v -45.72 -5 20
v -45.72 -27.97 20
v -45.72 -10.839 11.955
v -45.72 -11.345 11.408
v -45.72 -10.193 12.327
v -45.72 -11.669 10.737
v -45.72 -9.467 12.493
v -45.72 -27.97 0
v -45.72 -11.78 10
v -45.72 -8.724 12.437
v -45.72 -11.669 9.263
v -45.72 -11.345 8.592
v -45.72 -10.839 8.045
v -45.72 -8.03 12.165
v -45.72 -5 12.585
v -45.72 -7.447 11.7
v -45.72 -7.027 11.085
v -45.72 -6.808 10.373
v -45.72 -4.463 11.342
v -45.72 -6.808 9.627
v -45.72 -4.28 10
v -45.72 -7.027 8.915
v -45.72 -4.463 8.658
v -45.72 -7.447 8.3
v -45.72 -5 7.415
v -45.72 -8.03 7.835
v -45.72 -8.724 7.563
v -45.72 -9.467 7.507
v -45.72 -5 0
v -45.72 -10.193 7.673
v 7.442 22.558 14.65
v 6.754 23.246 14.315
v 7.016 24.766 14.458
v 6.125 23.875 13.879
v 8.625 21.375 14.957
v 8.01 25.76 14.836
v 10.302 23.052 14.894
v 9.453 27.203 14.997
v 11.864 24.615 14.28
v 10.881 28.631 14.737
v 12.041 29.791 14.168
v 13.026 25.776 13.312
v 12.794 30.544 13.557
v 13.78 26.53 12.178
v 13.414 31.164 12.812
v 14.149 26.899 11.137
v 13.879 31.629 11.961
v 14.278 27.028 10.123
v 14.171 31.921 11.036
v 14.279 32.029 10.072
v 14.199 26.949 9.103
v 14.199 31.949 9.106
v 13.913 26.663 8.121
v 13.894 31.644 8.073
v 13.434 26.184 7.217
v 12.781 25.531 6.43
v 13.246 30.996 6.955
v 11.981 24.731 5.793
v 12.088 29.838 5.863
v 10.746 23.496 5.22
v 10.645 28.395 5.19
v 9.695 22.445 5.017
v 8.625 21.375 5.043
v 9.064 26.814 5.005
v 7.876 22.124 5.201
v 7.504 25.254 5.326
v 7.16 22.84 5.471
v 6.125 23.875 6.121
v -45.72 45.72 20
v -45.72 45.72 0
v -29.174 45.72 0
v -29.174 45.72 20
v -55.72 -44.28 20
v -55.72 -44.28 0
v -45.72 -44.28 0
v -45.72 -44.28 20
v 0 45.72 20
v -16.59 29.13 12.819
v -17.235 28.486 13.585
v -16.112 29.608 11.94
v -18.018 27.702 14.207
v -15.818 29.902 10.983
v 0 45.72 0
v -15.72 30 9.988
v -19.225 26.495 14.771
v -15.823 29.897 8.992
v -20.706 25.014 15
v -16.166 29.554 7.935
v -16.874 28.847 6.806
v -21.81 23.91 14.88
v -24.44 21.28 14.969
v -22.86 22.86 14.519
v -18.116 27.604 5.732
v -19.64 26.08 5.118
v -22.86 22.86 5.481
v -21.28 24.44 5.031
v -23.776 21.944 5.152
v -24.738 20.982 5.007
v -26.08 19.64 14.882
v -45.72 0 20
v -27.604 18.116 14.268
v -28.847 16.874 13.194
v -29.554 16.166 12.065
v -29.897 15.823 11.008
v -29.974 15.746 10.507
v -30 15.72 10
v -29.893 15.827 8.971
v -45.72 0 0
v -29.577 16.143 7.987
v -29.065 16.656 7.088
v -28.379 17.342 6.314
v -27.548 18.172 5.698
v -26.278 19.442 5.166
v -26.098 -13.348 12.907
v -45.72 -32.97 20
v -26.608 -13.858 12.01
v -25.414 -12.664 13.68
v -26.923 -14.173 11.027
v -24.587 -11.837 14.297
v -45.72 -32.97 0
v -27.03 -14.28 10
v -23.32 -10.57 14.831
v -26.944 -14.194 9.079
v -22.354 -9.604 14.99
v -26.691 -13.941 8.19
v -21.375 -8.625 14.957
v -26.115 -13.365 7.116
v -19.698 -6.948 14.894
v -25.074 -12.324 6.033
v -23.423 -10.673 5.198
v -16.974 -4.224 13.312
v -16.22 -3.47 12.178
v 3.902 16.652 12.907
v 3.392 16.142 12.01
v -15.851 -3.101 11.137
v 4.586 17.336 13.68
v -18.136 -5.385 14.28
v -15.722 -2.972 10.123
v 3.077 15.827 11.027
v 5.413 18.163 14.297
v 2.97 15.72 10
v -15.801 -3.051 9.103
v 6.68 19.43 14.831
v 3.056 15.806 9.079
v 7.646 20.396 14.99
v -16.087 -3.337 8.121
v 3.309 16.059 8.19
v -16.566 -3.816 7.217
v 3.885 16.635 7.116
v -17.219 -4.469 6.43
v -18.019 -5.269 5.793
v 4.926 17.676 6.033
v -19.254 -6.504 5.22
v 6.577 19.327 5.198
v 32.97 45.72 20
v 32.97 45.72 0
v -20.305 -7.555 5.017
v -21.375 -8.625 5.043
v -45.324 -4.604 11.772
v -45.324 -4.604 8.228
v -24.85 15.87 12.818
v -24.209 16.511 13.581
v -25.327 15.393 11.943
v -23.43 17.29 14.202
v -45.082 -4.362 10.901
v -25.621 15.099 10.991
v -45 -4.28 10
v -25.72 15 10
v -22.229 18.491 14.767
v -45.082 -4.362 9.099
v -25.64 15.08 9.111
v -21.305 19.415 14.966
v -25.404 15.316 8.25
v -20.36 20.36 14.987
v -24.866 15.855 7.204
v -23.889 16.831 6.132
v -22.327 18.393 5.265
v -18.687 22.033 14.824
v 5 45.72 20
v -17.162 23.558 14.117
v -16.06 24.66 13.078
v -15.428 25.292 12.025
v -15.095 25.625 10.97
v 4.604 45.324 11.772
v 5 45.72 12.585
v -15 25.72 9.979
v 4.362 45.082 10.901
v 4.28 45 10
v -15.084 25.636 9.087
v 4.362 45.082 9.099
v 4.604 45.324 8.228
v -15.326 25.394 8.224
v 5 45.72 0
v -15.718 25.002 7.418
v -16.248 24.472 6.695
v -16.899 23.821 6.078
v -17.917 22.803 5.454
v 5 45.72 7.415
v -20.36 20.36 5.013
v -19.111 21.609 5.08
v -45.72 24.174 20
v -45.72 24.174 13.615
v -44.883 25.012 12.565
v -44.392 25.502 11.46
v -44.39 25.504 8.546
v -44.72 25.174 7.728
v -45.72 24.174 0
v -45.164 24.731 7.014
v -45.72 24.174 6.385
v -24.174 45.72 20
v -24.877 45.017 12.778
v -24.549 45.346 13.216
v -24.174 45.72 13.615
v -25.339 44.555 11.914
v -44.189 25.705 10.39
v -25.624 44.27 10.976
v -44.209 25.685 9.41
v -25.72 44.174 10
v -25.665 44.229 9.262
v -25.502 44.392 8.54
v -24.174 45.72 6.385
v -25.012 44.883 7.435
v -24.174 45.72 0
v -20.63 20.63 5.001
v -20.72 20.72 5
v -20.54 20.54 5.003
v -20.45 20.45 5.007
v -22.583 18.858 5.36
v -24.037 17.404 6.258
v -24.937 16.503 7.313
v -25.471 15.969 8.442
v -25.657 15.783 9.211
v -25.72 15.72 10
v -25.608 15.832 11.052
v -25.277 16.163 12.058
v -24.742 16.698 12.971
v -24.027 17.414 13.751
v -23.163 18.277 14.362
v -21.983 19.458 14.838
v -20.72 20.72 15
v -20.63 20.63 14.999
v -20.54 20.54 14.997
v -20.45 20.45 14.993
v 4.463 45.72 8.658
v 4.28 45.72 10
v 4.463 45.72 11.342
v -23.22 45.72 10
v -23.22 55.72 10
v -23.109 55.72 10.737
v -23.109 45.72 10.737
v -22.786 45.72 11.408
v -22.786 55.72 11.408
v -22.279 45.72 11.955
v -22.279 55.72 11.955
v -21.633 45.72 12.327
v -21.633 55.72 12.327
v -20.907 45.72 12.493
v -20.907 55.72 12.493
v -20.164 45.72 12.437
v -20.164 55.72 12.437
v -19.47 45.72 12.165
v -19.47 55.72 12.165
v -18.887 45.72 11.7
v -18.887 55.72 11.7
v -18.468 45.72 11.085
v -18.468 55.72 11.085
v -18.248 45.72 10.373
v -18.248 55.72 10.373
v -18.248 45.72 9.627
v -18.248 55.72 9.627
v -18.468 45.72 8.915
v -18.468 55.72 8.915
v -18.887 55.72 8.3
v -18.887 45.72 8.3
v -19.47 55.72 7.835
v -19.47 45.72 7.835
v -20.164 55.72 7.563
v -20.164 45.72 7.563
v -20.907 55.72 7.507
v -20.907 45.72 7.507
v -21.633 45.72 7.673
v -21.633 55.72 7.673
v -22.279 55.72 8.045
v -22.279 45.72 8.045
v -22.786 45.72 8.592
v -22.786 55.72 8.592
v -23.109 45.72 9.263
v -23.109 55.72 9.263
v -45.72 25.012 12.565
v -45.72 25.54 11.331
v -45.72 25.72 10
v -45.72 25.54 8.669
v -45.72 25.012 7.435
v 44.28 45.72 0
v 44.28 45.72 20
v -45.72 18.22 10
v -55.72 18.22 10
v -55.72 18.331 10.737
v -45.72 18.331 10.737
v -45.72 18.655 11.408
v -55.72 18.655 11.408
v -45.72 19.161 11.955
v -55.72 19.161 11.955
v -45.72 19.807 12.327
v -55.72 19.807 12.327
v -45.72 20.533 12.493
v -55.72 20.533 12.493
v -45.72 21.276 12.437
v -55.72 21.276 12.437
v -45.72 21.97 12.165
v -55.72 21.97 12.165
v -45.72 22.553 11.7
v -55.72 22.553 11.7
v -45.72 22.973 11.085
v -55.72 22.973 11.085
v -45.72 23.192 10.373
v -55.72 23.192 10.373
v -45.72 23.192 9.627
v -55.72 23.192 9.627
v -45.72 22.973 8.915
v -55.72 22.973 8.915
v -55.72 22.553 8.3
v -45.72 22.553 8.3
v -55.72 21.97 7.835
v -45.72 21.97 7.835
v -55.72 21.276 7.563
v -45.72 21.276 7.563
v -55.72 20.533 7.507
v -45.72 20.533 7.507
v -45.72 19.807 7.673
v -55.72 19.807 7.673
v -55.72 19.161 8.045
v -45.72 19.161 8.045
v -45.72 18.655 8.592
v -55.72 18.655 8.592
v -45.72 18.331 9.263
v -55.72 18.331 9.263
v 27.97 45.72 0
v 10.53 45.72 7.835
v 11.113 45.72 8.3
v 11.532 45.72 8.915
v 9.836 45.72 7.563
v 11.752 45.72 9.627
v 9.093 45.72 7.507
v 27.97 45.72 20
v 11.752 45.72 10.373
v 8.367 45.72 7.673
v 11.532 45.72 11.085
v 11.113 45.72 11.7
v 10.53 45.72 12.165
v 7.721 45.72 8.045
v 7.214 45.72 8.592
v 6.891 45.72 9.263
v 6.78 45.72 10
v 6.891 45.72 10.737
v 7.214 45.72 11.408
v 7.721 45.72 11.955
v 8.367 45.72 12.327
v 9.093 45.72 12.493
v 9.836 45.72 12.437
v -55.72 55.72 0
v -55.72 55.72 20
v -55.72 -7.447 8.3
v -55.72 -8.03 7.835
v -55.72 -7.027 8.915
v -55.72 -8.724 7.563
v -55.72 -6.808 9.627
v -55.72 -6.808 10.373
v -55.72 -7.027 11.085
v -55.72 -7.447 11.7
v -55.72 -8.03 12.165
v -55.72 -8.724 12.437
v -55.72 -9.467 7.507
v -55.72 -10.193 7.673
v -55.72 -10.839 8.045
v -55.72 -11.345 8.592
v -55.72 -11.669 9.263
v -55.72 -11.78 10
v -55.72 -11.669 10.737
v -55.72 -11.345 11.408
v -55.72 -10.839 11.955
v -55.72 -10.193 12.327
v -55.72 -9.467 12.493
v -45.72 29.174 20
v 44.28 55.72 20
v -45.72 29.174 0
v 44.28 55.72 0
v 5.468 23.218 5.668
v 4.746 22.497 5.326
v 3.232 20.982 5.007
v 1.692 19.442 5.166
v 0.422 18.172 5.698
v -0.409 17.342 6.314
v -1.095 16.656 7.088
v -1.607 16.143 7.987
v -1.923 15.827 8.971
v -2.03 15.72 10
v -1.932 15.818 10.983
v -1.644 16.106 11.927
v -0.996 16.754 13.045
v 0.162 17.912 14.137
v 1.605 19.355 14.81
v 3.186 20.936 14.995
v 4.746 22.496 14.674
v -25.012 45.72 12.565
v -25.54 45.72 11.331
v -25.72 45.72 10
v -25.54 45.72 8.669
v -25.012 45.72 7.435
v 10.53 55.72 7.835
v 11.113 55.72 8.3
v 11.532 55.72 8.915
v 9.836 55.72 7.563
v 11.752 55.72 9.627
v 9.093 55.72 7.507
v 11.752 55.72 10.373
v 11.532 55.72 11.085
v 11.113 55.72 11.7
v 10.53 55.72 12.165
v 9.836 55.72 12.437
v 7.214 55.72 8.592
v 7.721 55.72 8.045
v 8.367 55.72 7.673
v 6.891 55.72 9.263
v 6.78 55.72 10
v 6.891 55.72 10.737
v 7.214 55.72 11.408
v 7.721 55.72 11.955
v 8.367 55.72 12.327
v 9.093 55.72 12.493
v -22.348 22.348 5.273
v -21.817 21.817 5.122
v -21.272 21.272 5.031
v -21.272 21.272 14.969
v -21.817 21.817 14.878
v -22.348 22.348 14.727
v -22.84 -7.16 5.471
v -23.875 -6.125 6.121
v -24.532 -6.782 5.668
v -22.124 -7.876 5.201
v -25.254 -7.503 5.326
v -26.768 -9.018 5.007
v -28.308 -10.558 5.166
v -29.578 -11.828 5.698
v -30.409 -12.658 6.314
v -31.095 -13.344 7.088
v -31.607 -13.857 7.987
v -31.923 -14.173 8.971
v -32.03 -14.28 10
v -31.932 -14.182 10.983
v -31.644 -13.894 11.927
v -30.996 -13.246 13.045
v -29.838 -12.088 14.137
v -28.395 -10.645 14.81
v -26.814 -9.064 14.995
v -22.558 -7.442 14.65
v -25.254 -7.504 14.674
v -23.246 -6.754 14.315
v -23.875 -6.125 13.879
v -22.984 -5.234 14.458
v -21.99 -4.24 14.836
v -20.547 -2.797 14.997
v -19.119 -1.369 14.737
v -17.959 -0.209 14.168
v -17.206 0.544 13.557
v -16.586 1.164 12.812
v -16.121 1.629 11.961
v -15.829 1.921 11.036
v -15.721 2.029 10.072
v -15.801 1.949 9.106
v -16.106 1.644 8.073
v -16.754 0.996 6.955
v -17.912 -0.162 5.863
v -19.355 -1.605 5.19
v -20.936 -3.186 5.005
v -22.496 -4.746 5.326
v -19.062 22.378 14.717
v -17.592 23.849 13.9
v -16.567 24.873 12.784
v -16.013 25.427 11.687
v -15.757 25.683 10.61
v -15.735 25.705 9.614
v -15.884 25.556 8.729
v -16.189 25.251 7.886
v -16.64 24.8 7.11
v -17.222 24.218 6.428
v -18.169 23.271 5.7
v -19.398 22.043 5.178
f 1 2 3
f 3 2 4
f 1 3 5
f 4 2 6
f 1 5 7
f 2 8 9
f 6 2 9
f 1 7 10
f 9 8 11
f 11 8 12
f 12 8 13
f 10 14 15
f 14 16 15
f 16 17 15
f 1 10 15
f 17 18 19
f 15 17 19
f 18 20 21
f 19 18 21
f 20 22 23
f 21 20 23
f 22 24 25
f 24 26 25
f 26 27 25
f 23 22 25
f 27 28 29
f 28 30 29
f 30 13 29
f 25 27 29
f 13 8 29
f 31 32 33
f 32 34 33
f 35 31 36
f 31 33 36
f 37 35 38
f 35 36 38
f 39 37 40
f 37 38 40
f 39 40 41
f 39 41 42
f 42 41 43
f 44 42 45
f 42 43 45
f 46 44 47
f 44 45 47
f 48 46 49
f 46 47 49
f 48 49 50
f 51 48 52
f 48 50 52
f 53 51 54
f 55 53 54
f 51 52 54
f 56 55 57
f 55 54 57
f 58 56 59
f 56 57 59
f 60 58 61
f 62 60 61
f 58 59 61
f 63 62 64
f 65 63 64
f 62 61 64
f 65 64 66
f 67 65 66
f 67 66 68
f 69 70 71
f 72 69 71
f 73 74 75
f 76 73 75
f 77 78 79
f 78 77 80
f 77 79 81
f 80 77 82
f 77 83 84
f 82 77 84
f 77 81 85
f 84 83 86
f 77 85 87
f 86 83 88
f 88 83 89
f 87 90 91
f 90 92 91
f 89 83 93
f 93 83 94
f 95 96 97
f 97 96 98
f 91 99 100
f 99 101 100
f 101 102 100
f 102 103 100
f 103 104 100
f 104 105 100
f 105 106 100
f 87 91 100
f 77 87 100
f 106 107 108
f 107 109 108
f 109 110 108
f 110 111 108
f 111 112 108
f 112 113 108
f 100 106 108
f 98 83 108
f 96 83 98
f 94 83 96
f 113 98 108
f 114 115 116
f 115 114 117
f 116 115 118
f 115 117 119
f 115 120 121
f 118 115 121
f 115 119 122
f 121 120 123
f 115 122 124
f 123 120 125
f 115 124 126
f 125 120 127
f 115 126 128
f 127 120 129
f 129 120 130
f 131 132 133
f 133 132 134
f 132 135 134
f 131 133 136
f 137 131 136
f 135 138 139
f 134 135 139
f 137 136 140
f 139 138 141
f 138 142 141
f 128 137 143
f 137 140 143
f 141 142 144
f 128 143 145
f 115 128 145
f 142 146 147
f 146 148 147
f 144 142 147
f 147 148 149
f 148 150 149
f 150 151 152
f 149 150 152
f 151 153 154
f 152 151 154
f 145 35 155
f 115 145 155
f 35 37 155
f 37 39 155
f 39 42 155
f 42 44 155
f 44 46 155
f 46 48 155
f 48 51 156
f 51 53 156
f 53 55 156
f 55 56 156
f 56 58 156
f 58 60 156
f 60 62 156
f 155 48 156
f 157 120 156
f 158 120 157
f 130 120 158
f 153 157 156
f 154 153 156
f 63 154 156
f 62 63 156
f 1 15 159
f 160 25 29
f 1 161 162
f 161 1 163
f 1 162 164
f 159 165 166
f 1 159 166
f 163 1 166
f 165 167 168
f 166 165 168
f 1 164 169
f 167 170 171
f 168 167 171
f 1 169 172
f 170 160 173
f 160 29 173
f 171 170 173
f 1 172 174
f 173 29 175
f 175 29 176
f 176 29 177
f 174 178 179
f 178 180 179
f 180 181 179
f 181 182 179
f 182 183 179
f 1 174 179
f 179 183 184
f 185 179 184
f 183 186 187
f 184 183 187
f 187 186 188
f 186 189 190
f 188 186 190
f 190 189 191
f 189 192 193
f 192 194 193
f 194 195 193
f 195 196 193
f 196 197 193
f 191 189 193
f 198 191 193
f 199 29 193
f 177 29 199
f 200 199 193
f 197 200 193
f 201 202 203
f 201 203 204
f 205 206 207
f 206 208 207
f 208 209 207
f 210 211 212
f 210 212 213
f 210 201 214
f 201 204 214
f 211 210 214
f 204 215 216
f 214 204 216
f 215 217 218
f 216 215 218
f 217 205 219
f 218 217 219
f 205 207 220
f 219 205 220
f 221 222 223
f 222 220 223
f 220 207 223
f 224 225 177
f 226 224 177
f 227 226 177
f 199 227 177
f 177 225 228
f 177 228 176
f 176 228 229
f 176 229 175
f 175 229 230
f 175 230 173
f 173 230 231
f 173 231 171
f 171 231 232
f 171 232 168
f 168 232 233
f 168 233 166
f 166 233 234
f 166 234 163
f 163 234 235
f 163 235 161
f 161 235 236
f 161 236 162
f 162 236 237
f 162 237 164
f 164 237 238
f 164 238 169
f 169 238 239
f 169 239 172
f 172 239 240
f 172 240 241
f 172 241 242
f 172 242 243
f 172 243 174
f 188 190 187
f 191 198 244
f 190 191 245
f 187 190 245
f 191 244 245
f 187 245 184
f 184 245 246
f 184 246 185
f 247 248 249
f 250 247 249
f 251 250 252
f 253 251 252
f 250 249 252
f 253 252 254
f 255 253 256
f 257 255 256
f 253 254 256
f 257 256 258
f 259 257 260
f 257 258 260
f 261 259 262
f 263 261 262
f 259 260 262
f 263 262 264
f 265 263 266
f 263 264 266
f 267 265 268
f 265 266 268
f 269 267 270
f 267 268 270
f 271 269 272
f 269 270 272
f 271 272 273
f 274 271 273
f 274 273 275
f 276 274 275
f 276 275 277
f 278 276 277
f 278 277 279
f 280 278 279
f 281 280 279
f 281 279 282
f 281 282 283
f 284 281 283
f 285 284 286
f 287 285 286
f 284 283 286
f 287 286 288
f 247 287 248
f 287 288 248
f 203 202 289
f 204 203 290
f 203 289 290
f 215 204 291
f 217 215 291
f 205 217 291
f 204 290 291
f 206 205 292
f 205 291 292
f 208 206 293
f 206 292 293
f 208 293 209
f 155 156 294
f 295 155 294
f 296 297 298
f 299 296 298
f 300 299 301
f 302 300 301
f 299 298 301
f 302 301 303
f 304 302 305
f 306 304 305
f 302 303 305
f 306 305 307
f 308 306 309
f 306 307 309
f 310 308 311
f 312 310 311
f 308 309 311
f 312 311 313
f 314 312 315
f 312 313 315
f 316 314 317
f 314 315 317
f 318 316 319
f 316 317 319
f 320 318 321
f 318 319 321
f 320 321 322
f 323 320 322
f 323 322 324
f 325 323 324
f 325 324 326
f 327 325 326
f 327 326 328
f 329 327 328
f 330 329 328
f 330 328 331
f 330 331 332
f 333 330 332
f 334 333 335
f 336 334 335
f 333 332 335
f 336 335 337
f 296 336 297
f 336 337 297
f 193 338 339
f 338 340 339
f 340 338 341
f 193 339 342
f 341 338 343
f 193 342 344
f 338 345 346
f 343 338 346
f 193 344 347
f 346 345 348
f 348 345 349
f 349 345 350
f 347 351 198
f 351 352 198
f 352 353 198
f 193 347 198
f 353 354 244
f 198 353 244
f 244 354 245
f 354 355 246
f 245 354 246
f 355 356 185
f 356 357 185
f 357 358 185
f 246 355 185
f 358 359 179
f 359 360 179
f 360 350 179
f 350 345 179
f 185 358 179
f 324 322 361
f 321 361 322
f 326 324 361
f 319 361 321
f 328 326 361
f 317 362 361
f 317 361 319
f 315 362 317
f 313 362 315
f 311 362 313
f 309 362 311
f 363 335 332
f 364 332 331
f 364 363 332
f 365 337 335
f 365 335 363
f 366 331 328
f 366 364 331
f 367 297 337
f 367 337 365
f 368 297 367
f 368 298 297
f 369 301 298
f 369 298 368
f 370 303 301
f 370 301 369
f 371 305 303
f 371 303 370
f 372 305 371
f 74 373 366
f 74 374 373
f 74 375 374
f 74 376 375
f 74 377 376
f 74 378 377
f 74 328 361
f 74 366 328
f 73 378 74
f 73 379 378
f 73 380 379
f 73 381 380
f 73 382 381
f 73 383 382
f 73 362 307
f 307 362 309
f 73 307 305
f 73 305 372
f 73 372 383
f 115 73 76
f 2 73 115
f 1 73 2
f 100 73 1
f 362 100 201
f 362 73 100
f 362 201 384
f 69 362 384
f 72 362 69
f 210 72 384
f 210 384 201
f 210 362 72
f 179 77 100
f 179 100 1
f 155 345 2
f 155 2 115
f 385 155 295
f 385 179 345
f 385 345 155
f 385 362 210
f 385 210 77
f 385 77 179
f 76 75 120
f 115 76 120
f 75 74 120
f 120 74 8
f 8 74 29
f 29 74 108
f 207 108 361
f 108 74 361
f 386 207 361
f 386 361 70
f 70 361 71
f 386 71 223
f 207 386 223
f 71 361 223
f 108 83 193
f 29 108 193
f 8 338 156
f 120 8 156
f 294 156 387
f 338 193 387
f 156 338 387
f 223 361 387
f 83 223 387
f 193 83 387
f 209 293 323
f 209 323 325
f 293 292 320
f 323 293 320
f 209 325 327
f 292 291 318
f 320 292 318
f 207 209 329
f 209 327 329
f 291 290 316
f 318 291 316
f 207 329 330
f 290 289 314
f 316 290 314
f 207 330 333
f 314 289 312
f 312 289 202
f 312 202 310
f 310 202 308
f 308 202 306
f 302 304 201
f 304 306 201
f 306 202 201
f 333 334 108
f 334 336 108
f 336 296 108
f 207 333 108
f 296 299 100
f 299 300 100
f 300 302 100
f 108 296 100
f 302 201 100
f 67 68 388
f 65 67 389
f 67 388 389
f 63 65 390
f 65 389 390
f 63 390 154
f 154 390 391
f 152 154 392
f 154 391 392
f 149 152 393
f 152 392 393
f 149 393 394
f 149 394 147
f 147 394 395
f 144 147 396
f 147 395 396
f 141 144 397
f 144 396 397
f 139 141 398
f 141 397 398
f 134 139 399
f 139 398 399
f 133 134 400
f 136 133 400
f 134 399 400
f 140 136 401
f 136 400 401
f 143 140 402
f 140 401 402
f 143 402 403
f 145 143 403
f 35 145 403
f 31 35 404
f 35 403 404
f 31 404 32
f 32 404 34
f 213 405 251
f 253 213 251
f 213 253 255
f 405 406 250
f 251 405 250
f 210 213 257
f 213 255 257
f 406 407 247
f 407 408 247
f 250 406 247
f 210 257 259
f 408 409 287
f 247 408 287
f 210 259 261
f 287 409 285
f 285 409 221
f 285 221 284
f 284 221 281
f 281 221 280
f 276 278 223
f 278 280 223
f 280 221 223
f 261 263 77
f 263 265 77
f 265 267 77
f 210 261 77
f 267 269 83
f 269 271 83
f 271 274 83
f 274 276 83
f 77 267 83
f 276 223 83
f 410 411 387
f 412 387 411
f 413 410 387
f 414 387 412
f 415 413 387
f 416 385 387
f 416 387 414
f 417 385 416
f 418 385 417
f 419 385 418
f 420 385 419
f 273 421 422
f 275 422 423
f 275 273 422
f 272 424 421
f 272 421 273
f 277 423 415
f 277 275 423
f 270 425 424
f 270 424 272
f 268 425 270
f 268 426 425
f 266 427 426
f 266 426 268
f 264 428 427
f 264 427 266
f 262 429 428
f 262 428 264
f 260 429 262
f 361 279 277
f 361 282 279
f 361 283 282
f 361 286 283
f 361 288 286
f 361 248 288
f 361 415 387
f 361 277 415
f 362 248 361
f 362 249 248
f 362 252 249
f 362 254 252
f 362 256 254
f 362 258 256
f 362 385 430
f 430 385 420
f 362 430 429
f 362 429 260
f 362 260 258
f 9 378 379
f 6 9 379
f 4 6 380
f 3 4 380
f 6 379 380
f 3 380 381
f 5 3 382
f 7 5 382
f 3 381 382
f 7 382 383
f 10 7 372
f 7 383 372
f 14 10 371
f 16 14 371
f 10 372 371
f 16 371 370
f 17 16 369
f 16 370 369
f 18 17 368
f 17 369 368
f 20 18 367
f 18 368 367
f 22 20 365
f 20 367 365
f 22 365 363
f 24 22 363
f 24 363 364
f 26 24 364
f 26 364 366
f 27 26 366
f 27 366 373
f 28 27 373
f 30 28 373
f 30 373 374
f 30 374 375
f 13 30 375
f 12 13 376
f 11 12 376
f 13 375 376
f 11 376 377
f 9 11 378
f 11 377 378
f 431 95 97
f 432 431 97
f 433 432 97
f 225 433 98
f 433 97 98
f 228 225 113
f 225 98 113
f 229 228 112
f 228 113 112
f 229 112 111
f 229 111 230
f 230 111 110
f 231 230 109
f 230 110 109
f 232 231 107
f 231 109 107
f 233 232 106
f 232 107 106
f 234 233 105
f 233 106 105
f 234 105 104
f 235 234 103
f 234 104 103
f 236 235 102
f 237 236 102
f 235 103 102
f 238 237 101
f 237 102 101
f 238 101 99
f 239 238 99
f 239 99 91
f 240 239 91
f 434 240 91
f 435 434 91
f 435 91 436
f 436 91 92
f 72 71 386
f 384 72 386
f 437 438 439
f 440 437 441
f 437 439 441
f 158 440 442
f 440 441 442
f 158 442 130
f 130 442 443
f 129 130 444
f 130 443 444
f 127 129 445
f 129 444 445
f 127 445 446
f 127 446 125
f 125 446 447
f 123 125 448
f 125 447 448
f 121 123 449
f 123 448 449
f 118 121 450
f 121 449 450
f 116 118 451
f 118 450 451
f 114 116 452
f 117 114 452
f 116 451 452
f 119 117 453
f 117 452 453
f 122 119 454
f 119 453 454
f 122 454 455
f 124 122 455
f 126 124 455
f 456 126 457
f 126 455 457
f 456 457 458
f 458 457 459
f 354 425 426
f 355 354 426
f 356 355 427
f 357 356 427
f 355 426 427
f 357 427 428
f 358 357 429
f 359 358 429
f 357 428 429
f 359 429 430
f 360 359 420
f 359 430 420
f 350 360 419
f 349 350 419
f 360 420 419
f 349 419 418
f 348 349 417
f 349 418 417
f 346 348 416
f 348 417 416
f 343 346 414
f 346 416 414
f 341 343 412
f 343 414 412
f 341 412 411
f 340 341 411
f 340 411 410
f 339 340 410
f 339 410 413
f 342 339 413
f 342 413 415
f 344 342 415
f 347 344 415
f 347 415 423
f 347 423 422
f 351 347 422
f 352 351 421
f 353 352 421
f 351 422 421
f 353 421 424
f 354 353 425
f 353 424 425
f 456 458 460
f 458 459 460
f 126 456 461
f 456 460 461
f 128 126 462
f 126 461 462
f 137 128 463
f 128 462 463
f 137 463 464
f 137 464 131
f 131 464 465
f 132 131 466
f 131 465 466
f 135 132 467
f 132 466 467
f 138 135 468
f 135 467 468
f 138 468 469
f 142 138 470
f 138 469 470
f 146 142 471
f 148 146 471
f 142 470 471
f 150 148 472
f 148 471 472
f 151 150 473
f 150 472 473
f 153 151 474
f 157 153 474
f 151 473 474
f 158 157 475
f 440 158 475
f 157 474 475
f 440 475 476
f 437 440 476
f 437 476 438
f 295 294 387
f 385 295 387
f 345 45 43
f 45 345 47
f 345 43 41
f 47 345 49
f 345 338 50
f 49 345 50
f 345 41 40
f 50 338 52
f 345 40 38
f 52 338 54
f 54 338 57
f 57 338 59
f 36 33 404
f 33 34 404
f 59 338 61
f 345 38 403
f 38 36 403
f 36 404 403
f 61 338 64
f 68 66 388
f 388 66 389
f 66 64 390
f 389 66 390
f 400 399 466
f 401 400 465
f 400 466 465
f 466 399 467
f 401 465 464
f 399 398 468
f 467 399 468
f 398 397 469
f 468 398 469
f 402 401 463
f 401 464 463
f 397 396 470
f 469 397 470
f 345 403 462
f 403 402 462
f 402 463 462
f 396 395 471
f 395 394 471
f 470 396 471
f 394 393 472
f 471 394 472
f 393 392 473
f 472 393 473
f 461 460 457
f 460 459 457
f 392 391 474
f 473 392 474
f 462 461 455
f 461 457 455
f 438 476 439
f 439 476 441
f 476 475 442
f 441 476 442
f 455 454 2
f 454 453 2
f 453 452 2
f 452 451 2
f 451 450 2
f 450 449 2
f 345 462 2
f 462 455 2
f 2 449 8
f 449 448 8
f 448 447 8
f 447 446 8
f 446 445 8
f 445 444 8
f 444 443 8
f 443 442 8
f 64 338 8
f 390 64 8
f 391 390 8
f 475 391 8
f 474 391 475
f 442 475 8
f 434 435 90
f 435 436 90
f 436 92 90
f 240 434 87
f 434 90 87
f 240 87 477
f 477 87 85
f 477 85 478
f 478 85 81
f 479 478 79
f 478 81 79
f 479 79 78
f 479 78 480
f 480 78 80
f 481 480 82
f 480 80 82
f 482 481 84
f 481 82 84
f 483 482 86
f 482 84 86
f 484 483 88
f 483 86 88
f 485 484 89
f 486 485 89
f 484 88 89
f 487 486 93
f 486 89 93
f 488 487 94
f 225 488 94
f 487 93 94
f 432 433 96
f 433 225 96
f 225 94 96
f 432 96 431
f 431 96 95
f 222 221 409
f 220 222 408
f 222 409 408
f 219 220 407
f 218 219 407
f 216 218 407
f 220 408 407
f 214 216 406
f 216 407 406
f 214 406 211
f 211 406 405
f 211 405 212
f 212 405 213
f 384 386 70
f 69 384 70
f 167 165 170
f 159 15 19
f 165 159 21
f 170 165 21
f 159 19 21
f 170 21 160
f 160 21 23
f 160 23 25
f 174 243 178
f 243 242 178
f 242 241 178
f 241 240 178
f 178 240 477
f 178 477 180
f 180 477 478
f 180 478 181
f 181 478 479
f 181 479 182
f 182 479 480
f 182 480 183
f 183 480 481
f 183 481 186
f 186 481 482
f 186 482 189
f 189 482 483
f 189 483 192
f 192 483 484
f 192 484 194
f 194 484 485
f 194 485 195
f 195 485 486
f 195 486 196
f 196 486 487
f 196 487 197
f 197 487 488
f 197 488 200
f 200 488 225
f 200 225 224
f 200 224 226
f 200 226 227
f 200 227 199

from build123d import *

# Parameters (mm, degrees)
F0_W     = 10
F0_H     = 10
F1_DEPTH = 20
F2_R     = 5
F2_R_2   = 2.5
F3_DEPTH = 86.8
F4_DEPTH = 10
F5_R     = 5
F5_R_2   = 2.5
F6_DEPTH = 102.9
F7_DEPTH = 10


with BuildPart() as f1:
    # F0 (on Top) → F1 (new body)
    with BuildSketch(Plane.XY):
        Polygon((-45.7201178421, 45.7201178421), (-55.7201178421, 45.7201178421), (-55.7201178421, -44.2798821579), (-45.7201178421, -44.2798821579), (-45.7201178421, -32.9700666645), (-45.7201178421, -27.9700666645), (-45.7201178421, -5), (-45.7201178421, 0), (-45.7201178421, 24.1741651532), (-45.7201178421, 29.1741651532), align=None)
        with Locations((-50.7201178421, 50.7201178421)):
            Rectangle(F0_W, F0_H)
        Polygon((44.2798821579, 55.7201178421), (-45.7201178421, 55.7201178421), (-45.7201178421, 45.7201178421), (-29.1741651532, 45.7201178421), (-24.1741651532, 45.7201178421), (0, 45.7201178421), (5, 45.7201178421), (27.9700666645, 45.7201178421), (32.9700666645, 45.7201178421), (44.2798821579, 45.7201178421), align=None)
        Polygon((-29.1741651532, 45.7201178421), (-45.7201178421, 29.1741651532), (-45.7201178421, 24.1741651532), (-24.1741651532, 45.7201178421), align=None)
        Polygon((0, 45.7201178421), (-45.7201178421, 0), (-45.7201178421, -5), (5, 45.7201178421), align=None)
        Polygon((-45.7201178421, -32.9700666645), (32.9700666645, 45.7201178421), (27.9700666645, 45.7201178421), (-45.7201178421, -27.9700666645), align=None)
    extrude(amount=F1_DEPTH)

    # F2 (on face) → F3 (cut)
    with BuildSketch(Plane(origin=(-55.7201178421, 0, 0), x_dir=(0, -1, 0), z_dir=(-1, 0, 0))):
        with Locations((9.2798821579, 10)):
            Circle(F2_R)
        with Locations((9.2798821579, 10)):
            Circle(F2_R_2, mode=Mode.SUBTRACT)
        with Locations((-20.7201178421, 10)):
            Circle(F2_R)
        with Locations((-20.7201178421, 10)):
            Circle(F2_R_2, mode=Mode.SUBTRACT)
        with Locations((9.2798821579, 10)):
            Circle(F2_R_2)
        with Locations((-20.7201178421, 10)):
            Circle(F2_R_2)
    extrude(amount=-F3_DEPTH, mode=Mode.SUBTRACT)

    # F2 (on face) → F4 (join)
    with BuildSketch(Plane(origin=(-55.7201178421, 0, 0), x_dir=(0, -1, 0), z_dir=(-1, 0, 0))):
        with Locations((-20.7201178421, 10)):
            Circle(F2_R)
        with Locations((-20.7201178421, 10)):
            Circle(F2_R_2, mode=Mode.SUBTRACT)
        with Locations((9.2798821579, 10)):
            Circle(F2_R)
        with Locations((9.2798821579, 10)):
            Circle(F2_R_2, mode=Mode.SUBTRACT)
    extrude(amount=-F4_DEPTH)

    # F5 (on face) → F6 (cut)
    with BuildSketch(Plane(origin=(0, 55.7201178421, 0), x_dir=(-1, 0, 0), z_dir=(0, 1, 0))):
        with Locations((20.7201178421, 10)):
            Circle(F5_R)
        with Locations((20.7201178421, 10)):
            Circle(F5_R_2, mode=Mode.SUBTRACT)
        with Locations((-9.2798821579, 10)):
            Circle(F5_R)
        with Locations((-9.2798821579, 10)):
            Circle(F5_R_2, mode=Mode.SUBTRACT)
        with Locations((20.7201178421, 10)):
            Circle(F5_R_2)
        with Locations((-9.2798821579, 10)):
            Circle(F5_R_2)
    extrude(amount=-F6_DEPTH, mode=Mode.SUBTRACT)

    # F5 (on face) → F7 (join)
    with BuildSketch(Plane(origin=(0, 55.7201178421, 0), x_dir=(-1, 0, 0), z_dir=(0, 1, 0))):
        with Locations((-9.2798821579, 10)):
            Circle(F5_R)
        with Locations((-9.2798821579, 10)):
            Circle(F5_R_2, mode=Mode.SUBTRACT)
        with Locations((20.7201178421, 10)):
            Circle(F5_R)
        with Locations((20.7201178421, 10)):
            Circle(F5_R_2, mode=Mode.SUBTRACT)
    extrude(amount=-F7_DEPTH)


solid = f1.part
